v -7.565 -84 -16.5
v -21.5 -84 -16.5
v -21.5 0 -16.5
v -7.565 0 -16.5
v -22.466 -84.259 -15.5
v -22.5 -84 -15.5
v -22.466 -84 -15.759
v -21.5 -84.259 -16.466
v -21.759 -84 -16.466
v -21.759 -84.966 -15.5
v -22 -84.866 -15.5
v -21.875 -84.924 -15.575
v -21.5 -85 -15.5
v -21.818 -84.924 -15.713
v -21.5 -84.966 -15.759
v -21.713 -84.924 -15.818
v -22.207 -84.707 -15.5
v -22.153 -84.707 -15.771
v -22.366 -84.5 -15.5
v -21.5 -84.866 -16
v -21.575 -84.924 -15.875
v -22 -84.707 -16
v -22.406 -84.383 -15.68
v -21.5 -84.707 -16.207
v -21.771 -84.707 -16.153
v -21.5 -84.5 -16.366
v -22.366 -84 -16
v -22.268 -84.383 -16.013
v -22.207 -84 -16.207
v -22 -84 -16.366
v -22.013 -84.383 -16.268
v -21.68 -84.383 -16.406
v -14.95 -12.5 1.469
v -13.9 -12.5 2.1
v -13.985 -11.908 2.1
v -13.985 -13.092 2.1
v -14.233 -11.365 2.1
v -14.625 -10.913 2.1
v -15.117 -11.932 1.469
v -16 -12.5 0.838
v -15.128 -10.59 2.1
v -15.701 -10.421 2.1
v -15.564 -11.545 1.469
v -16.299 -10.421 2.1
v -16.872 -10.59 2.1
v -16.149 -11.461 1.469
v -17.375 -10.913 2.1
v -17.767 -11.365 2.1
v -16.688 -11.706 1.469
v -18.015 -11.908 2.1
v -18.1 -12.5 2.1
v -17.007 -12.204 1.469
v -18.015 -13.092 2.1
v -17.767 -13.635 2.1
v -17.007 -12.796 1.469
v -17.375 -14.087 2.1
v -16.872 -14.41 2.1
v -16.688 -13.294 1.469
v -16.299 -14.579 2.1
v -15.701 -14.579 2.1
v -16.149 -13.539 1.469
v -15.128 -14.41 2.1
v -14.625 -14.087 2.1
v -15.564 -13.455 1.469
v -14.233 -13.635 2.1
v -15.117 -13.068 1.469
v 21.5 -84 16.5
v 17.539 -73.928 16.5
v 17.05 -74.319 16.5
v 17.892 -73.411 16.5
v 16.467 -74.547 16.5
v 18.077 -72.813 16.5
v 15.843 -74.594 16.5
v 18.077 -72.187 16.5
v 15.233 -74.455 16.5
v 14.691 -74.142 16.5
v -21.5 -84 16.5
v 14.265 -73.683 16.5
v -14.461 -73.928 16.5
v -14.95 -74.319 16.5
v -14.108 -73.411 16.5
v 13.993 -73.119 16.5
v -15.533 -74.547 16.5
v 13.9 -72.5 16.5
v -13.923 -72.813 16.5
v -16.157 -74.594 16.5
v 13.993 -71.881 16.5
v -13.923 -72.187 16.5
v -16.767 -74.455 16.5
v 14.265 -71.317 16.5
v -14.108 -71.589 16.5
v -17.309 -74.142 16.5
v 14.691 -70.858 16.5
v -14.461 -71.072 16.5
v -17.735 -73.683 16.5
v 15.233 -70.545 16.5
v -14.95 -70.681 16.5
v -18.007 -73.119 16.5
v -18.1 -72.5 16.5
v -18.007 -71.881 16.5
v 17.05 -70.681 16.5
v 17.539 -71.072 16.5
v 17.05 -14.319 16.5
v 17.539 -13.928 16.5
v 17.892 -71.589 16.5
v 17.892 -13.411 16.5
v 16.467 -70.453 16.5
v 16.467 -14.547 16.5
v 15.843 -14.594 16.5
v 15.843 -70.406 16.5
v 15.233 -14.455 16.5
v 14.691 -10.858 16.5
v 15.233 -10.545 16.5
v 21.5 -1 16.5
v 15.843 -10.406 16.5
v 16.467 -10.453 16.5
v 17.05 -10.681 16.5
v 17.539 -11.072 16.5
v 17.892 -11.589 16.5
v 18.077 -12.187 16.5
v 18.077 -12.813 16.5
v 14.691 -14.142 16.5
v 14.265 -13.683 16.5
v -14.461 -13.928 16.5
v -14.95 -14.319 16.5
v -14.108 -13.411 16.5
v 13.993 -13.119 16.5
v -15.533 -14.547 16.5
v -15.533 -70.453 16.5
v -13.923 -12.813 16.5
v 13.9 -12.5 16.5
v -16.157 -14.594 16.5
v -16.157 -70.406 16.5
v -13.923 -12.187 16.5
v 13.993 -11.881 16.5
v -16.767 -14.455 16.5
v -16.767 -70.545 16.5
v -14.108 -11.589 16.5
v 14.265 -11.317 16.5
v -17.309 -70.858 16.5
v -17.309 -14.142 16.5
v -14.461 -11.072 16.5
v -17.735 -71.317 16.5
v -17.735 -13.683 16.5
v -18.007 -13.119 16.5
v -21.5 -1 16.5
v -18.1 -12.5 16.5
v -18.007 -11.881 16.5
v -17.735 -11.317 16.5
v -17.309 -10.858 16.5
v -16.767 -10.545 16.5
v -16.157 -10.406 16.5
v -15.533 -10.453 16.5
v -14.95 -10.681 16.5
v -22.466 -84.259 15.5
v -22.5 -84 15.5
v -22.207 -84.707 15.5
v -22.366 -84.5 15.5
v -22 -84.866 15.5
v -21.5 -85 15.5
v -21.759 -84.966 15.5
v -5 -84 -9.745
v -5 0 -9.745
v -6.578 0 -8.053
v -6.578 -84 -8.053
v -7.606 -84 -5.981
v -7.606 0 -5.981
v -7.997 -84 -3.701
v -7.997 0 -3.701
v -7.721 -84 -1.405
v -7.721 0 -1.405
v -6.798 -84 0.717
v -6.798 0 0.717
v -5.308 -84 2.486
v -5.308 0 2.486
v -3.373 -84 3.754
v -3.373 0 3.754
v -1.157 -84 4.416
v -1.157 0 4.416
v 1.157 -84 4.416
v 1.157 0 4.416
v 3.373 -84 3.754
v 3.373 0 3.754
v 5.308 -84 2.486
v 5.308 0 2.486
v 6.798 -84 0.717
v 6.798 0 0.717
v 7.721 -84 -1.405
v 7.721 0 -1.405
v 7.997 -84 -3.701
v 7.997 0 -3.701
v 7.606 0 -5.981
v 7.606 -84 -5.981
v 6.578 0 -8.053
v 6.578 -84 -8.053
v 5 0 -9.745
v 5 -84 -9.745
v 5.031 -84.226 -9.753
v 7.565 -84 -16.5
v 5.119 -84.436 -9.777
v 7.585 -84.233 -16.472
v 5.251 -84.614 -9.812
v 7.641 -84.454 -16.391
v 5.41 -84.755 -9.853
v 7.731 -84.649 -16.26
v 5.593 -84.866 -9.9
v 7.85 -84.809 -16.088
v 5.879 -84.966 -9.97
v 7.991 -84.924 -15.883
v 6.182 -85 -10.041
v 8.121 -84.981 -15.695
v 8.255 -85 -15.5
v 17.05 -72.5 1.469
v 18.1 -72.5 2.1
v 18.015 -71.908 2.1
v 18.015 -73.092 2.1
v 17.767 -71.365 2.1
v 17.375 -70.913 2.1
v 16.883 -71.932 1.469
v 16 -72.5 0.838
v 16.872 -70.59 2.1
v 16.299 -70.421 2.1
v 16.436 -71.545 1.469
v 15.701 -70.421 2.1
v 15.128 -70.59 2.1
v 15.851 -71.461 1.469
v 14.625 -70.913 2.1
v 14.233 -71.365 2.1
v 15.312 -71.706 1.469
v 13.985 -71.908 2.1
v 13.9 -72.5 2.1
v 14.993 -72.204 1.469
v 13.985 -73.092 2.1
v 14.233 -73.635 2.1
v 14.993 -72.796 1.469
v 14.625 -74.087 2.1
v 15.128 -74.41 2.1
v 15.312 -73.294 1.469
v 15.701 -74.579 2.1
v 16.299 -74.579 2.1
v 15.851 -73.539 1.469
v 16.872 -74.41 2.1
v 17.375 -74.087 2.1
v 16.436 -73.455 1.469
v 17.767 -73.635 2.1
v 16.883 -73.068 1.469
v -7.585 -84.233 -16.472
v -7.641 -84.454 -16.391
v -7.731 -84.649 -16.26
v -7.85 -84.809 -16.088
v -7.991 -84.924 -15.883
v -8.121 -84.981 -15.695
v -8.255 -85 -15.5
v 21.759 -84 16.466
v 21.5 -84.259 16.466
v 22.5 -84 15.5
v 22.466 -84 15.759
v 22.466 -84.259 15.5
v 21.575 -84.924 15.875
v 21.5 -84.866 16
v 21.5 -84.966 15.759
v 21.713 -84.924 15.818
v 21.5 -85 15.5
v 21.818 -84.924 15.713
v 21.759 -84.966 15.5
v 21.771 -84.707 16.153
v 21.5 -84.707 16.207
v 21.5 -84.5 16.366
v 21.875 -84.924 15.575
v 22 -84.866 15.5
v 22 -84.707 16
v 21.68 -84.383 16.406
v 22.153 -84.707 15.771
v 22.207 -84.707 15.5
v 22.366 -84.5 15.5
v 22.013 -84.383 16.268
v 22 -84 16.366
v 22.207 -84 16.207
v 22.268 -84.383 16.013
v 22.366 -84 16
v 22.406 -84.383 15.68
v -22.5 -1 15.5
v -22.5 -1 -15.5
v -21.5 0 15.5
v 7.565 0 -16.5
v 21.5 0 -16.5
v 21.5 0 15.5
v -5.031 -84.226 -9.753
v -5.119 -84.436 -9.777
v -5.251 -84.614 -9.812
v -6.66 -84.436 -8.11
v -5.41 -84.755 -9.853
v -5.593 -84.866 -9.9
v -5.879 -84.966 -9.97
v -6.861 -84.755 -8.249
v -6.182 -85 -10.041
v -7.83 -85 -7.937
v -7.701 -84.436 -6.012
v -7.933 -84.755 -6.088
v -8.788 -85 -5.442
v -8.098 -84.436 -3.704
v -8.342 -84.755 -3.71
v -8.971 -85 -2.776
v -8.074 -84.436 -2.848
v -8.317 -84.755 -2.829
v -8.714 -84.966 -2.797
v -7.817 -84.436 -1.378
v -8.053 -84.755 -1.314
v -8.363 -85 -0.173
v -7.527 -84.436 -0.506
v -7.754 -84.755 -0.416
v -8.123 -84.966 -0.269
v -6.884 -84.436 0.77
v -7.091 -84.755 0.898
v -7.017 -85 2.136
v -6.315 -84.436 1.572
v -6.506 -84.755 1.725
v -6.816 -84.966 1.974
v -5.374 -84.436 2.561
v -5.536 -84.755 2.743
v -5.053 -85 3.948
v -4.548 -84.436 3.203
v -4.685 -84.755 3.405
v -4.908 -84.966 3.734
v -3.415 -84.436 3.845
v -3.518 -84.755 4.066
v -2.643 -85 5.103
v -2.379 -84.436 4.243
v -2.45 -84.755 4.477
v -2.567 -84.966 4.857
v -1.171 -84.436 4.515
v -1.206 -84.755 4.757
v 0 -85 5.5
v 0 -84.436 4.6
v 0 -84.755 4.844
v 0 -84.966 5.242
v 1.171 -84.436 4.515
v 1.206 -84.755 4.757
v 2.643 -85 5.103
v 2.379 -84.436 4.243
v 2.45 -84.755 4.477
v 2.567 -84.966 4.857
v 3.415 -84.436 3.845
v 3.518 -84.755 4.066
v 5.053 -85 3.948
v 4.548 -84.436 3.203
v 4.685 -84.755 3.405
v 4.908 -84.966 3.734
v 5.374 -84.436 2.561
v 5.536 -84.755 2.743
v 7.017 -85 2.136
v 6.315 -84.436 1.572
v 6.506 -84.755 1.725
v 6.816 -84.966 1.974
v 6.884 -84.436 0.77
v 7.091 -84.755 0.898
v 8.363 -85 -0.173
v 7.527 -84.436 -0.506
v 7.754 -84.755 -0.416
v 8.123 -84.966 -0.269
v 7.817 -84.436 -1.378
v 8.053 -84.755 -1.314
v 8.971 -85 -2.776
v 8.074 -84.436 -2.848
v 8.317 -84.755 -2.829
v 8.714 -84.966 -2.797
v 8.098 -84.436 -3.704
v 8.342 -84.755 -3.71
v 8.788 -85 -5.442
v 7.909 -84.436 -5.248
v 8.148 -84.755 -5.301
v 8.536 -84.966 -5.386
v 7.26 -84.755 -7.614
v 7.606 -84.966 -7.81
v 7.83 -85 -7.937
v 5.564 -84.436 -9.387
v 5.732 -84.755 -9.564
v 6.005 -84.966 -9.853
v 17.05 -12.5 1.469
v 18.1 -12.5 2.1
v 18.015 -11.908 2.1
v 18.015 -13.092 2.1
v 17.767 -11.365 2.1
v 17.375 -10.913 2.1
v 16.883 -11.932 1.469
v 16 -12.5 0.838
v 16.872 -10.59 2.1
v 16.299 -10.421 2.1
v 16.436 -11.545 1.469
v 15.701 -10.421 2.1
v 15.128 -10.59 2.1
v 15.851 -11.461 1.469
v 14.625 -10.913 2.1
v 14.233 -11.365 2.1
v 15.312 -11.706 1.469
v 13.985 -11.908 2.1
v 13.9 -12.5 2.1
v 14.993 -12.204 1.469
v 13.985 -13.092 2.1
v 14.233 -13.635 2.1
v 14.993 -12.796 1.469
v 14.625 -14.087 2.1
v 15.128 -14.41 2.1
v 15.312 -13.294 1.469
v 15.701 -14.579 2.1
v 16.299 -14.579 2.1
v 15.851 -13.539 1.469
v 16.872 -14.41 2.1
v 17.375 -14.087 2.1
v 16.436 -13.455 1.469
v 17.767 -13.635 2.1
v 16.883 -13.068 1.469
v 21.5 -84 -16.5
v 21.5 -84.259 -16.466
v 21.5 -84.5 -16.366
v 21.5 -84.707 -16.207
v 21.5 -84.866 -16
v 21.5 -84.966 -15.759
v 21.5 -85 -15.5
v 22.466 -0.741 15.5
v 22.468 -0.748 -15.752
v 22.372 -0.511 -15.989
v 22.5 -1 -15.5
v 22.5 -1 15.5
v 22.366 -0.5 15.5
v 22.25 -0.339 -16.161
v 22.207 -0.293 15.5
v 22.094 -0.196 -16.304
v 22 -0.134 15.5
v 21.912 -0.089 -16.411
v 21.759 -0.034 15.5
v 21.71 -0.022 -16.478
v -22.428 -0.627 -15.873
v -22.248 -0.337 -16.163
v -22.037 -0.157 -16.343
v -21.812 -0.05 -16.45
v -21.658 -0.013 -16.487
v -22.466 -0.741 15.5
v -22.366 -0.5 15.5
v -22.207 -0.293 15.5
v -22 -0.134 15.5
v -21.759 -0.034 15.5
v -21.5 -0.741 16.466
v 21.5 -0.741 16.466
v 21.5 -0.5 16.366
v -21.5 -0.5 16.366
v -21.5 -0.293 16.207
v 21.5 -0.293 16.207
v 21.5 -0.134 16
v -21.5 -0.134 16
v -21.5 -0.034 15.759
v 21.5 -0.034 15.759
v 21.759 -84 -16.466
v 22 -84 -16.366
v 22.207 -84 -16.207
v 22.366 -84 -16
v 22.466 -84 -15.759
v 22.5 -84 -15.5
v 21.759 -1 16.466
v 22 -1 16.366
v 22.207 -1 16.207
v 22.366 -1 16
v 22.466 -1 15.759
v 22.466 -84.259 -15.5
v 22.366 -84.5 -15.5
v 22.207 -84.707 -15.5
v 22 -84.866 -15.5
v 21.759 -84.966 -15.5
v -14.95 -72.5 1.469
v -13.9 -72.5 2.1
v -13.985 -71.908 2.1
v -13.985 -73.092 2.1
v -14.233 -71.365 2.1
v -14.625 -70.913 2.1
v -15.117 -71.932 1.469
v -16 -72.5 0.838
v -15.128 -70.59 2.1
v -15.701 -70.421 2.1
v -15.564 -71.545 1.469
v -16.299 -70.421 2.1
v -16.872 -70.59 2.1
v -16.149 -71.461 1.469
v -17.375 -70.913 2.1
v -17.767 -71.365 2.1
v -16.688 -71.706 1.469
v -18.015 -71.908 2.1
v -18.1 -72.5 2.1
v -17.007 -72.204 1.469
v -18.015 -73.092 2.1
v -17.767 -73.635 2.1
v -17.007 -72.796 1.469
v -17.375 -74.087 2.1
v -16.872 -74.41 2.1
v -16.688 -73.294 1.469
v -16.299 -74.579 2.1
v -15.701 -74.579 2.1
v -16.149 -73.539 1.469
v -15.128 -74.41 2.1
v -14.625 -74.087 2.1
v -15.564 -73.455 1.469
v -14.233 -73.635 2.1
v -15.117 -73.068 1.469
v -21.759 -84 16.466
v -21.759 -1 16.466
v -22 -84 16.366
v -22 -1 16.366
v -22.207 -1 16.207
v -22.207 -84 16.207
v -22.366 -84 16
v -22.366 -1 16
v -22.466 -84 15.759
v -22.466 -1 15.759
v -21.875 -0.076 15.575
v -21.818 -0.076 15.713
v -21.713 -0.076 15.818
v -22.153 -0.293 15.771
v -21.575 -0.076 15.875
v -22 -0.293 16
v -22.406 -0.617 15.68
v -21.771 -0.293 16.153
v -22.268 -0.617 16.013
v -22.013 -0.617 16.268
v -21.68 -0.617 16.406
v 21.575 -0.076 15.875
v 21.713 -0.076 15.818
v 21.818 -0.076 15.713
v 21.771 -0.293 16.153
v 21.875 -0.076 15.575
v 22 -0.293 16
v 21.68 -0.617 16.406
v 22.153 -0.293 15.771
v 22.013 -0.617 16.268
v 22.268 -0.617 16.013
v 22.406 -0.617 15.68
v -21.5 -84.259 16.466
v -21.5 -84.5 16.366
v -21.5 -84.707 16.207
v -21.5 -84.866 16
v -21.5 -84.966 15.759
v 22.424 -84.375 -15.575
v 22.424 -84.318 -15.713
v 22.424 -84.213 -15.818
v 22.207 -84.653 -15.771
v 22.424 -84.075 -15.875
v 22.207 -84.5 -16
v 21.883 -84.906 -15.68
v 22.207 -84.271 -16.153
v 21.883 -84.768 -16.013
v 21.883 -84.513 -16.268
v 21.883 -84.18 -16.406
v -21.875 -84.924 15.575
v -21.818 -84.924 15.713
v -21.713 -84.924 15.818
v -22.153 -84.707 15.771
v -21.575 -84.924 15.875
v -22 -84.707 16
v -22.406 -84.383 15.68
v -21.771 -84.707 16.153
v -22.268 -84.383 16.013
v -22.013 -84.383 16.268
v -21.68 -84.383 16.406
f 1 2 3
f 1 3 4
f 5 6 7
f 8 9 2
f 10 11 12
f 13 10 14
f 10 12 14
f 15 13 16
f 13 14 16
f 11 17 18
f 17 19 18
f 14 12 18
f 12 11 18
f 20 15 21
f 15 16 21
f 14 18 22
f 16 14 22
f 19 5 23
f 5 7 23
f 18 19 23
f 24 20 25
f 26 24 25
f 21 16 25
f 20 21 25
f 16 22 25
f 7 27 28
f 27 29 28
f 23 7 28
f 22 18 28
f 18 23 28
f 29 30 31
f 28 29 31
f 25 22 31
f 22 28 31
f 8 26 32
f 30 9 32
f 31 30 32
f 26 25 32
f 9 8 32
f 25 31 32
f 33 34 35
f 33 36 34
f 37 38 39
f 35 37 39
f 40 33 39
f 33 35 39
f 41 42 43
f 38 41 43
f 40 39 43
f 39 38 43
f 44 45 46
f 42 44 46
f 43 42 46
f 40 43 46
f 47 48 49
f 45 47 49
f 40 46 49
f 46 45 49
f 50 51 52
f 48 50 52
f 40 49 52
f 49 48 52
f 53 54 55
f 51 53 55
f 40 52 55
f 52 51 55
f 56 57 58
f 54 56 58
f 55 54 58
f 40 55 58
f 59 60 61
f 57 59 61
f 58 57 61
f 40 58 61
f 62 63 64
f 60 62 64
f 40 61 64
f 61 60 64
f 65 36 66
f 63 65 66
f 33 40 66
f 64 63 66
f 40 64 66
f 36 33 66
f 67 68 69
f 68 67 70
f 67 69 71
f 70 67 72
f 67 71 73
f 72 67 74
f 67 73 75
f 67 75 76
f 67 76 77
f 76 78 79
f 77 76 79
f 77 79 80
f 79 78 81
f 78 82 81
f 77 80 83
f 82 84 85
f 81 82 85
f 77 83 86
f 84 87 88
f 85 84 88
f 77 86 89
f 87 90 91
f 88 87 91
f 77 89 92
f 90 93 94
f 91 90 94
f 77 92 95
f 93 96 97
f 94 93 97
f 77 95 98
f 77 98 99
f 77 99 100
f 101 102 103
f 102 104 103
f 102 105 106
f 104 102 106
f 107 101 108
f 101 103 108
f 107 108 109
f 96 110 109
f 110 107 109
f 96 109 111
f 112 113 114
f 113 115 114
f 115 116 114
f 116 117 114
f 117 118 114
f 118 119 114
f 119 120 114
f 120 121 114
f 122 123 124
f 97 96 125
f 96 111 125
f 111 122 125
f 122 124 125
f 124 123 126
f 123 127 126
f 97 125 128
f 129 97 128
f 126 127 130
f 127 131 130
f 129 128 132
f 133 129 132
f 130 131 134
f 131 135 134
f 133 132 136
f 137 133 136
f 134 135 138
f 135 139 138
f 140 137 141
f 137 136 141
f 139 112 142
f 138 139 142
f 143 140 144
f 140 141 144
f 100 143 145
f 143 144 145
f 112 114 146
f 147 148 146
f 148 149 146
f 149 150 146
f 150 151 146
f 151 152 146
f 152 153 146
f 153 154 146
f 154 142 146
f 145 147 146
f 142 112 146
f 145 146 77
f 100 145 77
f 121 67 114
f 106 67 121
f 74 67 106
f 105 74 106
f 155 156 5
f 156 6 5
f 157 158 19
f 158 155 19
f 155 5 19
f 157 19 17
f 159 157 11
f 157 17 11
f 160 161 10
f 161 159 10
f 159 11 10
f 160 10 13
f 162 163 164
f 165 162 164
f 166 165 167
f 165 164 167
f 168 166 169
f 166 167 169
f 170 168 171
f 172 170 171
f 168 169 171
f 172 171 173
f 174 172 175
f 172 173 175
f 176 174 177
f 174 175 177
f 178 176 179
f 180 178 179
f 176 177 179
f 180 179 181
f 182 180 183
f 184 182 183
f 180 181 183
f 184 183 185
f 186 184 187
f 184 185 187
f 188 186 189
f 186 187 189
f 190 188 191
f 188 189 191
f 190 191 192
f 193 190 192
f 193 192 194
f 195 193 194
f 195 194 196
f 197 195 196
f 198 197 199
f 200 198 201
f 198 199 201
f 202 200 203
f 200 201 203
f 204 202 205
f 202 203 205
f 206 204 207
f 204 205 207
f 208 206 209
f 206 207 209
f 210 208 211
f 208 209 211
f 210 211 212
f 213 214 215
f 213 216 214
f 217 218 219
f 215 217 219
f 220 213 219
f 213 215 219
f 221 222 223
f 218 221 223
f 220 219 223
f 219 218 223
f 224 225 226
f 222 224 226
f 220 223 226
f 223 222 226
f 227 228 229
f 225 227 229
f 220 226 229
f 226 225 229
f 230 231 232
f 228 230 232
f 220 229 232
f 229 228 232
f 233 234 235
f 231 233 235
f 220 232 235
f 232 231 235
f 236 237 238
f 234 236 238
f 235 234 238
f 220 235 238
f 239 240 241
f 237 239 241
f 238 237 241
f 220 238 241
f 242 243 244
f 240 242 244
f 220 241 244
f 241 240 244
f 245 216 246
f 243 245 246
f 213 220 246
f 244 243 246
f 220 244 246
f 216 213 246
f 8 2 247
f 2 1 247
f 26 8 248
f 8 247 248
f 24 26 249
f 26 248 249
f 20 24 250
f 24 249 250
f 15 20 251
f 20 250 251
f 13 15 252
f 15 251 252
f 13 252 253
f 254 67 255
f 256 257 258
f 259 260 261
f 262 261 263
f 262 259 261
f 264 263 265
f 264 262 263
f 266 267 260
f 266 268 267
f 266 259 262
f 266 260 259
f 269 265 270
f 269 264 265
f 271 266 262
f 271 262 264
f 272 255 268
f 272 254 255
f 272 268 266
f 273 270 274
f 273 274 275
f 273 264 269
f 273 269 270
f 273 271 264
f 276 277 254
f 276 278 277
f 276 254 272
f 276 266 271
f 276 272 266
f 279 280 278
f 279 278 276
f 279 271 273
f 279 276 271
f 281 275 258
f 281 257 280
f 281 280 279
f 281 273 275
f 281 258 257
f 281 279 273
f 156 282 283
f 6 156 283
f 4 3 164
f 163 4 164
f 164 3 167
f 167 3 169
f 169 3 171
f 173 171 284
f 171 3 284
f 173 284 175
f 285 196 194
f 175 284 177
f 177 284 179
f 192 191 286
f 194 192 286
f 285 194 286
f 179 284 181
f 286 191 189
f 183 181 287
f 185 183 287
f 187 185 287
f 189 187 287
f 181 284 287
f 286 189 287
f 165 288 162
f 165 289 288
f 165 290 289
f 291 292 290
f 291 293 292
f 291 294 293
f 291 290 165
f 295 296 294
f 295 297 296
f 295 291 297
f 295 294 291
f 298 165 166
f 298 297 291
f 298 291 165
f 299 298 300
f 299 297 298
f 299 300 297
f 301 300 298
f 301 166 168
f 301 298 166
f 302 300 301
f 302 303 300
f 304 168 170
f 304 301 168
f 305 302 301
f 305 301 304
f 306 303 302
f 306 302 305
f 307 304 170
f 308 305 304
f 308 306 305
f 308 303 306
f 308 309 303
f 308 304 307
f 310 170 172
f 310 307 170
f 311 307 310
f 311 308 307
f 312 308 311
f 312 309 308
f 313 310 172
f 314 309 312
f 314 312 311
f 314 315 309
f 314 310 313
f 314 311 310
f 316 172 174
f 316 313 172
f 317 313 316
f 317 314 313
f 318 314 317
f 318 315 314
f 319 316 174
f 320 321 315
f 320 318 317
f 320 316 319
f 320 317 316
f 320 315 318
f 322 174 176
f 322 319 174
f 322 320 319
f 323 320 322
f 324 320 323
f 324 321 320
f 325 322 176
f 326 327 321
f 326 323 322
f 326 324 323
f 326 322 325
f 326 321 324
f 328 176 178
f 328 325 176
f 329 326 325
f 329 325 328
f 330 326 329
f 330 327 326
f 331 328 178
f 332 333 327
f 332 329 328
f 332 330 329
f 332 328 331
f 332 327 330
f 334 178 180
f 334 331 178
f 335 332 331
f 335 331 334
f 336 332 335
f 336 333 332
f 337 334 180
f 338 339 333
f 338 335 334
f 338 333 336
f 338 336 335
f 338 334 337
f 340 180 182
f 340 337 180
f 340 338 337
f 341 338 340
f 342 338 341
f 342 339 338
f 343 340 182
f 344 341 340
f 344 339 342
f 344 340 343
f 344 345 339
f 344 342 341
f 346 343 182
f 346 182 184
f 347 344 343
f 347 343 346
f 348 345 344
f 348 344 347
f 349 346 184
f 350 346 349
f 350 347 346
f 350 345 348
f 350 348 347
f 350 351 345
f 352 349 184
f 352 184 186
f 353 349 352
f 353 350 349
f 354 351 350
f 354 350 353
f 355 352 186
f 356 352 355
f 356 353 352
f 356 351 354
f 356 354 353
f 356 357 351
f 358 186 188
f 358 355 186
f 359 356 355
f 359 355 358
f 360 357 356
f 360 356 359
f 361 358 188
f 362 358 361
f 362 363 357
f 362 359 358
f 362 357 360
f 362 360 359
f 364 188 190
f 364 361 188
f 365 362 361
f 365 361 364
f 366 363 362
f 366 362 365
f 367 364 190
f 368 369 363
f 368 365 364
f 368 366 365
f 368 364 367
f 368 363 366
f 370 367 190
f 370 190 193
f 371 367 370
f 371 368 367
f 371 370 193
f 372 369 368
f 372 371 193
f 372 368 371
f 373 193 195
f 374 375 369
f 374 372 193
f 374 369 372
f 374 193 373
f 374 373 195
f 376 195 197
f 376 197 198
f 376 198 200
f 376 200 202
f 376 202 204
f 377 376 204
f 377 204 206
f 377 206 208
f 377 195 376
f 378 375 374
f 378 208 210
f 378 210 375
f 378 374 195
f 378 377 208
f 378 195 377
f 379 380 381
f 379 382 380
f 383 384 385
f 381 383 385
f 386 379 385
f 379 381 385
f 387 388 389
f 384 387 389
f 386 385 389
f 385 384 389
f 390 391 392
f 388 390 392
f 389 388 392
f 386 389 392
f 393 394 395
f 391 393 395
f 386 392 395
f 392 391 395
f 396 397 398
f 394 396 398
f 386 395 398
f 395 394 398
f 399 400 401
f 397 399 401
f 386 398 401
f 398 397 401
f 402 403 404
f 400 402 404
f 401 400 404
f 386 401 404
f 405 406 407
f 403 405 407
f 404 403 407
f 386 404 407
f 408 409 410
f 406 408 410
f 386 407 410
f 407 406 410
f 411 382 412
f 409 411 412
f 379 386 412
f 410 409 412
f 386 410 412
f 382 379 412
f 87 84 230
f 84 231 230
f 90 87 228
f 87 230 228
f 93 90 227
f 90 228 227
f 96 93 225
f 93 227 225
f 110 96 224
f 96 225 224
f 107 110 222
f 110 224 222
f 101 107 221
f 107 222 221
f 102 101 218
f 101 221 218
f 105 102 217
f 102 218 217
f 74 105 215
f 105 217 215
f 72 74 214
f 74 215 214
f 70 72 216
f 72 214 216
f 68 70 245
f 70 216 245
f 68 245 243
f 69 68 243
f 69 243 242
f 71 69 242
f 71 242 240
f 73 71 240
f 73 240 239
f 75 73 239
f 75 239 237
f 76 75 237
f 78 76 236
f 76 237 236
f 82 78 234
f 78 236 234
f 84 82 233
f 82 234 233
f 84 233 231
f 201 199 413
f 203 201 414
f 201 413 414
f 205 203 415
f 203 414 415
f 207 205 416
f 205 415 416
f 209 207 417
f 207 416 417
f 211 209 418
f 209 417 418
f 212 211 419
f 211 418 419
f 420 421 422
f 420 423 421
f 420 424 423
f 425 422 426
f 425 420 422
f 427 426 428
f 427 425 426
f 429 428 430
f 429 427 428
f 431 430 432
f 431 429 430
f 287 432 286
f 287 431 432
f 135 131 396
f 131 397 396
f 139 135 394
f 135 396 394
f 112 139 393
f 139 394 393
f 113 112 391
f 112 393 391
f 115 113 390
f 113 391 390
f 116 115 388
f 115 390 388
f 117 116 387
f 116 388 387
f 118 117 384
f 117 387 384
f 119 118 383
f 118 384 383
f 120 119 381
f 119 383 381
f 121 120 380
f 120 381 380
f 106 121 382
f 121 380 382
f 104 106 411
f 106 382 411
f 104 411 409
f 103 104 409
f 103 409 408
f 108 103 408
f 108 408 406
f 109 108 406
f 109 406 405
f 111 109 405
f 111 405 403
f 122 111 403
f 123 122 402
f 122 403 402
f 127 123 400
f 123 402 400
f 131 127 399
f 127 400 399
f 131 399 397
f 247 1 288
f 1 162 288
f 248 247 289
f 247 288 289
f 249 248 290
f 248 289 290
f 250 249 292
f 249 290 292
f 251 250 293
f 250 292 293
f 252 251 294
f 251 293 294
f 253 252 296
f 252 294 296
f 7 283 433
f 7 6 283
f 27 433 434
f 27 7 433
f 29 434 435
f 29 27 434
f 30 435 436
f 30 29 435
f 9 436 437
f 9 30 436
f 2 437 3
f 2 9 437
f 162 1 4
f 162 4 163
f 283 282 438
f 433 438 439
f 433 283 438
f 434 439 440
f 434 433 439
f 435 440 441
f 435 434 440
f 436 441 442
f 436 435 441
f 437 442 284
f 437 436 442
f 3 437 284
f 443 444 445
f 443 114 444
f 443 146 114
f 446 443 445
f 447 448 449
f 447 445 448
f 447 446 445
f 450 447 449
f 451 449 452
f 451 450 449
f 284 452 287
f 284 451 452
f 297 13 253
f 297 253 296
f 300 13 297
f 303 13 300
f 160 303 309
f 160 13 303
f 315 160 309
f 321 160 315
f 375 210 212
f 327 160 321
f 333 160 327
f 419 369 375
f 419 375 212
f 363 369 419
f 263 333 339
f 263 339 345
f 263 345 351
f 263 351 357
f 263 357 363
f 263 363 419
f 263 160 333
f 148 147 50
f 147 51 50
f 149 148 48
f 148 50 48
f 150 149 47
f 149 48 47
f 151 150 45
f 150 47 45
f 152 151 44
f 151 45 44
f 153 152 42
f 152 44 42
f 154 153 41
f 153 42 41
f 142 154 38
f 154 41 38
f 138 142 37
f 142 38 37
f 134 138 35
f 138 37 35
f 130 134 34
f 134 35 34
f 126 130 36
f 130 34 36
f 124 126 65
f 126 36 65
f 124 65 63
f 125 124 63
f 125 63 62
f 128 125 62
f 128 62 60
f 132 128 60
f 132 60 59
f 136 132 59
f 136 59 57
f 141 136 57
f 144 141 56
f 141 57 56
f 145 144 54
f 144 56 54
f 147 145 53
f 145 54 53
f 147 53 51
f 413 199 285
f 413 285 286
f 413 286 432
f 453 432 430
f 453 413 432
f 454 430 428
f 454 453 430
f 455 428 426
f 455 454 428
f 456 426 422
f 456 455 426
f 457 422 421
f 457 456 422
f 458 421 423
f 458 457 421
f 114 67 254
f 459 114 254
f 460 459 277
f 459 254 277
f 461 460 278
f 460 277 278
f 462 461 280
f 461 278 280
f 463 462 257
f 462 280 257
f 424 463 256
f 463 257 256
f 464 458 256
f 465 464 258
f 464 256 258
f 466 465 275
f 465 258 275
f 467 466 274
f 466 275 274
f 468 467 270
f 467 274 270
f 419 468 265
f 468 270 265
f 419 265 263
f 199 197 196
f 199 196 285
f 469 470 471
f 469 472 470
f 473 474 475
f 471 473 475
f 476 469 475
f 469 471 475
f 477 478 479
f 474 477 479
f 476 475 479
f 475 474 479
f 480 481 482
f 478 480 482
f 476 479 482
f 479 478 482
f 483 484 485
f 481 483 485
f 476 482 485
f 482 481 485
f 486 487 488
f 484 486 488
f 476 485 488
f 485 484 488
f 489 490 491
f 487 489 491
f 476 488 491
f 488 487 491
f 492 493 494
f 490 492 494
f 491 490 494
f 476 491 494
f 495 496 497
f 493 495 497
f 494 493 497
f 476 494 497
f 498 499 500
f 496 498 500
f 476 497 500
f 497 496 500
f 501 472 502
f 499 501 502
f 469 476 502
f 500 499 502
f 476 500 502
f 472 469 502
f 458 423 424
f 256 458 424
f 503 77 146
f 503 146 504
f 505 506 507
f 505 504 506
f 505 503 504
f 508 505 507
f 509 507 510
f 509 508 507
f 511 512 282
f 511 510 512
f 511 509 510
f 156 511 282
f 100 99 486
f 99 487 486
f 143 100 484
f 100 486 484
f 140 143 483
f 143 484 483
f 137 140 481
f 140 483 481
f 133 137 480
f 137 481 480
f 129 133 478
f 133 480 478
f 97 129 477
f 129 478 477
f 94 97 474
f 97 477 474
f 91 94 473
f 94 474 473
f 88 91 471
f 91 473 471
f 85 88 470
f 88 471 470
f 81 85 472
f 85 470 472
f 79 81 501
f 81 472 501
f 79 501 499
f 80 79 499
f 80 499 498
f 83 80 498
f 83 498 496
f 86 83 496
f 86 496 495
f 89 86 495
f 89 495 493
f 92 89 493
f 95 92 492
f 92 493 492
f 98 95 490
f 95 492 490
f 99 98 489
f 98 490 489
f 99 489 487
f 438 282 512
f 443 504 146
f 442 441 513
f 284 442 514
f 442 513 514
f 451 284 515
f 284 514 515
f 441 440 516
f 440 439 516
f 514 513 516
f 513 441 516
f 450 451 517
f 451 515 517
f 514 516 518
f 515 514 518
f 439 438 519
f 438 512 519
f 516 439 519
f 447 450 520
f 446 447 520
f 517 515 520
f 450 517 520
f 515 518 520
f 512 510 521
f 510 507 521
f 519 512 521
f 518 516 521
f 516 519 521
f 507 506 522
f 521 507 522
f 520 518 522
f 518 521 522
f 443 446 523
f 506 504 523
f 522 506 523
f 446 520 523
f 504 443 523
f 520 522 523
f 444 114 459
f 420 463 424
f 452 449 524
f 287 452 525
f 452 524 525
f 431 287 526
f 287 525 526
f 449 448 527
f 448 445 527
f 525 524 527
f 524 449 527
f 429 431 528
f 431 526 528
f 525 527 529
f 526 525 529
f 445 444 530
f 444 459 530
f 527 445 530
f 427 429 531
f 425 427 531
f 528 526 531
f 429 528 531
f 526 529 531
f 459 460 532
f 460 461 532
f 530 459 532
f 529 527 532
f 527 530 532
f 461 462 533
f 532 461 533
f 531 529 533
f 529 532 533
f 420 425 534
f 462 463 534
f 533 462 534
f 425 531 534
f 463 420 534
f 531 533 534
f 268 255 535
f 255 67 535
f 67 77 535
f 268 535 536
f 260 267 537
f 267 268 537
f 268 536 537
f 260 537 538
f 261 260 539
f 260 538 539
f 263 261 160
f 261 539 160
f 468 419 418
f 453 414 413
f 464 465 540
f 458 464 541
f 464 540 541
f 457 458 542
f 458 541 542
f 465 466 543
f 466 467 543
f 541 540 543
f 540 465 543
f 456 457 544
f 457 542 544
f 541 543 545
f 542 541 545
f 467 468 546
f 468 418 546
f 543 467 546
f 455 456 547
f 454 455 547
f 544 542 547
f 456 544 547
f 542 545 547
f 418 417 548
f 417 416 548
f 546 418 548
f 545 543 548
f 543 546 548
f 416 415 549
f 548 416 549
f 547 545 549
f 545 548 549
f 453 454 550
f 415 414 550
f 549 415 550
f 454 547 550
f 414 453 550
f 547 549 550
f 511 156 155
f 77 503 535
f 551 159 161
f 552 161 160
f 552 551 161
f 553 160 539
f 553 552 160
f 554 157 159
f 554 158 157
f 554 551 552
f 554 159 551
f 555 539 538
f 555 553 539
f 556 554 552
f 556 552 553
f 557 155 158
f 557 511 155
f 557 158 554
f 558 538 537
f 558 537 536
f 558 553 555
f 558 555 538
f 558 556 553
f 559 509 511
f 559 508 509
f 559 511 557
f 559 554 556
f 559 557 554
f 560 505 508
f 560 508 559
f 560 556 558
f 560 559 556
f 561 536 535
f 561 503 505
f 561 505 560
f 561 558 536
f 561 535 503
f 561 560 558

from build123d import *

# Parameters (mm, degrees)
F1_DEPTH = 85
F2_R     = 1
F4_D     = 4.2
F4_DEPTH = 14.4
F4_TIP   = 1.2618073


with BuildPart() as f1:
    # F0 (on Front) → F1 (new body)
    with BuildSketch(Plane.XZ):
        with BuildLine():
            Line((22.5, 16.5), (-22.5, 16.5))
            Line((-22.5, 16.5), (-22.5, -16.5))
            Line((-22.5, -16.5), (-7.5654657558, -16.5))
            Line((-7.5654657558, -16.5), (-5, -9.7449979984))
            ThreePointArc((-5, -9.7449979984), (0, 4.5), (5, -9.7449979984))
            Line((5, -9.7449979984), (7.5654657558, -16.5))
            Line((7.5654657558, -16.5), (22.5, -16.5))
            Line((22.5, -16.5), (22.5, 16.5))
        make_face()
    extrude(amount=F1_DEPTH)

    # F2
    f2_edges = [f1.edges().sort_by_distance(p)[0] for p in [
        (-22.5, -42.5, 16.5),
        (-22.5, -42.5, -16.5),
        (-22.5, 0, 0),
        (-22.5, -85, 0),
        (22.5, -42.5, 16.5),
        (0, 0, 16.5),
        (0, -85, 16.5),
        (-15.032733, -85, -16.5),
        (-6.282733, -85, -13.122499),
        (0, -85, 4.5),
        (6.282733, -85, -13.122499),
        (15.032733, -85, -16.5),
        (22.5, -85, 0),
        (22.5, -42.5, -16.5),
        (22.5, 0, 0),
    ]]
    fillet(f2_edges, radius=F2_R)

    # F4
    with Locations(Plane.XY.offset(16.5)):
        with Locations((-16, -12.5), (16, -12.5), (-16, -72.5), (16, -72.5)):
            Hole(F4_D / 2, depth=F4_DEPTH)
            with Locations((0, 0, -(F4_DEPTH + F4_TIP / 2))):  # 118° drill point
                Cone(0, F4_D / 2, F4_TIP, mode=Mode.SUBTRACT)


solid = f1.part
